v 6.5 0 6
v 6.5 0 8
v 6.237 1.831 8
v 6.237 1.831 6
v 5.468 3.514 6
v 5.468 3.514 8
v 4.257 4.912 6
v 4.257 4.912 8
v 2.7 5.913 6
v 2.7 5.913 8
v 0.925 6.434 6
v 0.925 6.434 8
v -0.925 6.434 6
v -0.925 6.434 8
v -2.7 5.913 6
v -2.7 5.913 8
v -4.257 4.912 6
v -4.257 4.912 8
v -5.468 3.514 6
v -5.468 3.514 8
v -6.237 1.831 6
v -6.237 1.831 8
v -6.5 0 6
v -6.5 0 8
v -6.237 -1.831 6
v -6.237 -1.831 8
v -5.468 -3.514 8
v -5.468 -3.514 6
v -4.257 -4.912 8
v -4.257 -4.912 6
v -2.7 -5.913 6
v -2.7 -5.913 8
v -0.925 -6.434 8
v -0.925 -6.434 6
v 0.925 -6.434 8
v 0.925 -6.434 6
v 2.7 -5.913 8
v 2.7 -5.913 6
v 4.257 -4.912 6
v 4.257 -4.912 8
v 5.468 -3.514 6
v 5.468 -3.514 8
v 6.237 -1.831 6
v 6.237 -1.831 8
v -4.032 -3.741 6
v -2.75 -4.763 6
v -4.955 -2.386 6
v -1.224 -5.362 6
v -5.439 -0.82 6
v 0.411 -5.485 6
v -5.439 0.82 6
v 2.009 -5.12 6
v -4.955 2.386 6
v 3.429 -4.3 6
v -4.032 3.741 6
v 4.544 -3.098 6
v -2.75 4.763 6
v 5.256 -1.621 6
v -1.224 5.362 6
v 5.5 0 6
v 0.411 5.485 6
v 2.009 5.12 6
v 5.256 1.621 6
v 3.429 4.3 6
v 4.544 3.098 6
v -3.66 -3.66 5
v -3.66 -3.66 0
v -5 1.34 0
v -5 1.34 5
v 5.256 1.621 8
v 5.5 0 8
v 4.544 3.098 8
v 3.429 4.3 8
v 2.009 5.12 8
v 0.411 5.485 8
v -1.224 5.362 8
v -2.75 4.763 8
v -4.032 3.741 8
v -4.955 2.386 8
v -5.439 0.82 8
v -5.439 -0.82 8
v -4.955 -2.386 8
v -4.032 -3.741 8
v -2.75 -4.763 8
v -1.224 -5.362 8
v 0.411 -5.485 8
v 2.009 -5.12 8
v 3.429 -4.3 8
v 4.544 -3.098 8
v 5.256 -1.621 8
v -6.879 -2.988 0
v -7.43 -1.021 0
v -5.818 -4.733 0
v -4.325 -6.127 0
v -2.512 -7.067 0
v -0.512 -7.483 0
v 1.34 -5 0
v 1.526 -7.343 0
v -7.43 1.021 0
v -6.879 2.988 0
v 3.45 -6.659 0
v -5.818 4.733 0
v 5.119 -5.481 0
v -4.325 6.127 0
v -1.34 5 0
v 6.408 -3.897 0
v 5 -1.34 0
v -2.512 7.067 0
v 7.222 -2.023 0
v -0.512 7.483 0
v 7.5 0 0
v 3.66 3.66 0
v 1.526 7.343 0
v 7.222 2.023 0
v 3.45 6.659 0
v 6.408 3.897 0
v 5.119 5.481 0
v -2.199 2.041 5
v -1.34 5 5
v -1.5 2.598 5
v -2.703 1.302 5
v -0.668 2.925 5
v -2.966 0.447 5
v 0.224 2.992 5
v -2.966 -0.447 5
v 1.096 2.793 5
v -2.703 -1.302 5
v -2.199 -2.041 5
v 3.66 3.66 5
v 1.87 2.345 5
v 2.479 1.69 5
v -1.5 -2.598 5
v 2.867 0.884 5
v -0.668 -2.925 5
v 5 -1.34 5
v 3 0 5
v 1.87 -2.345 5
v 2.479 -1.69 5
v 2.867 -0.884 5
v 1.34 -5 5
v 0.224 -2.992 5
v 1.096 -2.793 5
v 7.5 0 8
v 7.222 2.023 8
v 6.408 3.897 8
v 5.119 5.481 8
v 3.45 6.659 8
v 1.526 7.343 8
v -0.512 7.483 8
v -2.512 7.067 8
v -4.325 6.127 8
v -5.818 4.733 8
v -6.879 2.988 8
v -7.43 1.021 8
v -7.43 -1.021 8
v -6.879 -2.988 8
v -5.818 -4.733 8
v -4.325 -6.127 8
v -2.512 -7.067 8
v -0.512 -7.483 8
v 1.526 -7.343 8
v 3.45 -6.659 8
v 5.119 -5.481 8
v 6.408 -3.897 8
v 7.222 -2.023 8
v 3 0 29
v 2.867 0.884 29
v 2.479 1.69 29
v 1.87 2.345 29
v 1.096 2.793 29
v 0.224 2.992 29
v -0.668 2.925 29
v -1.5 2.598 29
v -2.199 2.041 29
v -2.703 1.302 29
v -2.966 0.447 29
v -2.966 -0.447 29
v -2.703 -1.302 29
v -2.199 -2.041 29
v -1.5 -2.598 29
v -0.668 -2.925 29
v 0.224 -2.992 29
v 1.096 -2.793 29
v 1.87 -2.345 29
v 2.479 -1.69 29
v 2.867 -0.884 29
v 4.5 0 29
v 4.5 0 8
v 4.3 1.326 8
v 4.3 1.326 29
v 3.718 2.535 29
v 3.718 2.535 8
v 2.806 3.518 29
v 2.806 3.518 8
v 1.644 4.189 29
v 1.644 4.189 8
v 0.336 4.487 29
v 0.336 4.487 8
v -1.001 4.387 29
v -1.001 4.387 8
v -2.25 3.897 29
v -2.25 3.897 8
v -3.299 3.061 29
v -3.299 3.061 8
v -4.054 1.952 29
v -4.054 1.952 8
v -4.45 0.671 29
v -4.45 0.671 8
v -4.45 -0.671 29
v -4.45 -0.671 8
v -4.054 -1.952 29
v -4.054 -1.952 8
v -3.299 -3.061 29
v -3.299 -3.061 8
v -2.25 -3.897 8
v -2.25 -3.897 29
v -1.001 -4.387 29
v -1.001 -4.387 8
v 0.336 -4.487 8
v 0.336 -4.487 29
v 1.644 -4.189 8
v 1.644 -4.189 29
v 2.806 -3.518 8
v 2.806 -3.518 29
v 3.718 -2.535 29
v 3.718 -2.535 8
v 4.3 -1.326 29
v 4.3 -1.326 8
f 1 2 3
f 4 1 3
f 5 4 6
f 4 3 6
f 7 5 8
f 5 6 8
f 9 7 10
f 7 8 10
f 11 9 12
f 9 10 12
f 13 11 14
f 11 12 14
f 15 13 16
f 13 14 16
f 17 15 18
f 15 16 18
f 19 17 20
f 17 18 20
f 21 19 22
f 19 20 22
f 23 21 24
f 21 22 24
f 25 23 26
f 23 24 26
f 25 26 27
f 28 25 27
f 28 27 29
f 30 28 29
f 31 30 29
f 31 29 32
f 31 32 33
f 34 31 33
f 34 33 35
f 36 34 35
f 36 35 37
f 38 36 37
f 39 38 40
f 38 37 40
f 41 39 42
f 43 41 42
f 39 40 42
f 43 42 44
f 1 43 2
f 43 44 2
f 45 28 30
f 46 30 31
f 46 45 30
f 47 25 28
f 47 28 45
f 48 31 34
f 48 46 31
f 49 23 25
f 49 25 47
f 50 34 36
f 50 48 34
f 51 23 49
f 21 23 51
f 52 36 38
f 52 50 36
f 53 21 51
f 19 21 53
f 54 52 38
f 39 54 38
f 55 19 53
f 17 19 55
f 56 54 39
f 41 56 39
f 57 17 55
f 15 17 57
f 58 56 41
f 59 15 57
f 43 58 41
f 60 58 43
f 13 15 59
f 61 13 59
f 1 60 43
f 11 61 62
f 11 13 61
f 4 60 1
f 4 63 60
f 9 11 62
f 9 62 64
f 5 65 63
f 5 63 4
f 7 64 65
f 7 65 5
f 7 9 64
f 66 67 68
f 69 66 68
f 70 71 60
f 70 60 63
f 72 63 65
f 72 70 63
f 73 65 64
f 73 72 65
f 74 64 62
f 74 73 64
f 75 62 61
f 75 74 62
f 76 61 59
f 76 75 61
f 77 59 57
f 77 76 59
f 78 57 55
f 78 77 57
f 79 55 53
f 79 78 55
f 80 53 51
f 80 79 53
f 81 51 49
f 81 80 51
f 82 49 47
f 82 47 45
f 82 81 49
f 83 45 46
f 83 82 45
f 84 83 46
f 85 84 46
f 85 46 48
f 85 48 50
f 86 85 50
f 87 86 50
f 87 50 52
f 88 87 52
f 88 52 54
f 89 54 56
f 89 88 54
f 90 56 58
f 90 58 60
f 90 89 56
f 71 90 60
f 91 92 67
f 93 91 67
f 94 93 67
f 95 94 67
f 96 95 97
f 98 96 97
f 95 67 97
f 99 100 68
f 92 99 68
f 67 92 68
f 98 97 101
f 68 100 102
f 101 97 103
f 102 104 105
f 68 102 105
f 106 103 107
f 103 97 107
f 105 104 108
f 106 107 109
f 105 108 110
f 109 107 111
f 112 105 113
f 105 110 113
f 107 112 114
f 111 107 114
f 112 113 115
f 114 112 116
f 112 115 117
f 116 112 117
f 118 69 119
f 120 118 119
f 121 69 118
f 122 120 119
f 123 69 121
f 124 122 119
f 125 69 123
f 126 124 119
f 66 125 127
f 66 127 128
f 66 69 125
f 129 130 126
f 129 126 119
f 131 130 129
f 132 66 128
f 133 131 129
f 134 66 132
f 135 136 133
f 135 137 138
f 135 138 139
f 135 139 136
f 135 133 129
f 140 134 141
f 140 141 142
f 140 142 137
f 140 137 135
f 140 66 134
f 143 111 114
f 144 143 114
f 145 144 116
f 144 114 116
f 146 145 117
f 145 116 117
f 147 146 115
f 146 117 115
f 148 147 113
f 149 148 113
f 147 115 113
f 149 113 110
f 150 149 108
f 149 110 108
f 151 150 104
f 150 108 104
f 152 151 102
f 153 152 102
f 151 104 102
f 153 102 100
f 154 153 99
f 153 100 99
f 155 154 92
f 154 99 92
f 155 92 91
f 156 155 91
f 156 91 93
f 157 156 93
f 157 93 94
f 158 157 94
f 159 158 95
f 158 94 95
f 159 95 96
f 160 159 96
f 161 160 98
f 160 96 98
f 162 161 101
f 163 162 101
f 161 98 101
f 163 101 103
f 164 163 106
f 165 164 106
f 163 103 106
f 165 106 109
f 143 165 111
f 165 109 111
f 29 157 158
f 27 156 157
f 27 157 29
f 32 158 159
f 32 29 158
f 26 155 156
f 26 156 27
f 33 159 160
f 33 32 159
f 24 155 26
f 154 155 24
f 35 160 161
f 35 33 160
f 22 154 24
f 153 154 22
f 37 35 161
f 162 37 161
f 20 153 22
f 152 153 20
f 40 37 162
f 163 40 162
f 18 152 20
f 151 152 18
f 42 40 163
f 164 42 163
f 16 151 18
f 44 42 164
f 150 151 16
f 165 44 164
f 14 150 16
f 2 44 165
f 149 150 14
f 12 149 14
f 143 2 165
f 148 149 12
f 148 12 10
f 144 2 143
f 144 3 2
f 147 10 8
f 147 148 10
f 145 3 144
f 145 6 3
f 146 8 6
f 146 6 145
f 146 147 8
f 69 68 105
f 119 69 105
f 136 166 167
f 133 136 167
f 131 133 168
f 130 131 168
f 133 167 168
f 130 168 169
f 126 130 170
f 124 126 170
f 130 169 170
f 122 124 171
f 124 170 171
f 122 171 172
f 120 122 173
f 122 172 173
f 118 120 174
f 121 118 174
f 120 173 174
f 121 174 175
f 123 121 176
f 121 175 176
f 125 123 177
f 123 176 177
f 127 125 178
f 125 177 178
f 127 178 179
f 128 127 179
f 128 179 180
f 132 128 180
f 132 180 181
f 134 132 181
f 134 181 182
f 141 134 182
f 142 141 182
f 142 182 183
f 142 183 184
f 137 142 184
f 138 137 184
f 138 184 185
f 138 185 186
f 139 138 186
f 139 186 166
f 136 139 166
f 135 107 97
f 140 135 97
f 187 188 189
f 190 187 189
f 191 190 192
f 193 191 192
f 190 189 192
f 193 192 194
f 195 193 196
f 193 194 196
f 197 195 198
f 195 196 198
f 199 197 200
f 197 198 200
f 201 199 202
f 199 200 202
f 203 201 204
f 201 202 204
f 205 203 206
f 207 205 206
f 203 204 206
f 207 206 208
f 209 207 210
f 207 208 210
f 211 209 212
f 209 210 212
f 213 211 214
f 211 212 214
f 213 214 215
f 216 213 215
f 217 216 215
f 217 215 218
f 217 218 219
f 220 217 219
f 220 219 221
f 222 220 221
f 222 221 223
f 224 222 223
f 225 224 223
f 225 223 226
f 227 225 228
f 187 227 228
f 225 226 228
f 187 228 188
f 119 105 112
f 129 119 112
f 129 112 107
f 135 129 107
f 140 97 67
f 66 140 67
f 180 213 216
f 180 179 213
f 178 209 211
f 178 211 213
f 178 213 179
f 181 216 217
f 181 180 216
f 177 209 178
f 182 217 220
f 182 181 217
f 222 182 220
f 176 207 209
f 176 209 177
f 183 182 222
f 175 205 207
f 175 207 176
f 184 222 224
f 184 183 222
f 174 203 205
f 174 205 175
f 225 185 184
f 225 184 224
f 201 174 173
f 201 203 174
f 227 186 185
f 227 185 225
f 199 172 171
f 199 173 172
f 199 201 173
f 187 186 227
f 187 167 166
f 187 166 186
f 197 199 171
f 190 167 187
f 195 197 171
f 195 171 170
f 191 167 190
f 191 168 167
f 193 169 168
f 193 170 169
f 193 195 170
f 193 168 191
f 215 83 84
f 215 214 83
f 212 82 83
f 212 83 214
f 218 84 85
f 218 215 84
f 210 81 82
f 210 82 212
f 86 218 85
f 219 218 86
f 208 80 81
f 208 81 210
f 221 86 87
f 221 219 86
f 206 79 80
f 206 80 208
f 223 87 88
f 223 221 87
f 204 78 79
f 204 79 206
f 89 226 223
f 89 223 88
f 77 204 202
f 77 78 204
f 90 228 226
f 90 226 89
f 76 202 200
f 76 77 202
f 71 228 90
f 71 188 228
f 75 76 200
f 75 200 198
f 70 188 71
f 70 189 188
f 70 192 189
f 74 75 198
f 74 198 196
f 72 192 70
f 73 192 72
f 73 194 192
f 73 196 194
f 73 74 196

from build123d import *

# Parameters (mm, degrees)
SKETCH_R        = 7.5
PAD_DEPTH       = 8
SKETCH001_R     = 4.5
PAD001_DEPTH    = 21
SKETCH002_R     = 6.5
SKETCH002_R_2   = 5.5
POCKET_DEPTH    = 2
SKETCH003_R     = 3
POCKET001_DEPTH = 25
POCKET002_DEPTH = 5


with BuildPart() as part:
    # Sketch → Pad (new body)
    with BuildSketch(Plane.XY):
        Circle(SKETCH_R)
    extrude(amount=PAD_DEPTH)

    # Sketch001 (on Face3 of Pad) → Pad001 (join)
    with BuildSketch(Plane.XY.offset(8)):
        Circle(SKETCH001_R)
    extrude(amount=PAD001_DEPTH)

    # Sketch002 (on Face3 of Pad001) → Pocket (cut)
    with BuildSketch(Plane.XY.offset(8)):
        Circle(SKETCH002_R)
        Circle(SKETCH002_R_2, mode=Mode.SUBTRACT)
    extrude(amount=-POCKET_DEPTH, mode=Mode.SUBTRACT)

    # Sketch003 (on Face9 of Pocket) → Pocket001 (cut)
    with BuildSketch(Plane.XY.offset(29)):
        Circle(SKETCH003_R)
    extrude(amount=-POCKET001_DEPTH, mode=Mode.SUBTRACT)

    # Sketch004 (on Face2 of Pocket001) → Pocket002 (cut)
    with BuildSketch(Plane(origin=(0, 0, 0), x_dir=(1, 0, 0), z_dir=(0, 0, -1))):
        Polygon((3.660254, -3.660254), (5, 1.339746), (1.339746, 5), (-3.660254, 3.660254), (-5, -1.339746), (-1.339746, -5), align=None)
    extrude(amount=-POCKET002_DEPTH, mode=Mode.SUBTRACT)


solid = part.part
